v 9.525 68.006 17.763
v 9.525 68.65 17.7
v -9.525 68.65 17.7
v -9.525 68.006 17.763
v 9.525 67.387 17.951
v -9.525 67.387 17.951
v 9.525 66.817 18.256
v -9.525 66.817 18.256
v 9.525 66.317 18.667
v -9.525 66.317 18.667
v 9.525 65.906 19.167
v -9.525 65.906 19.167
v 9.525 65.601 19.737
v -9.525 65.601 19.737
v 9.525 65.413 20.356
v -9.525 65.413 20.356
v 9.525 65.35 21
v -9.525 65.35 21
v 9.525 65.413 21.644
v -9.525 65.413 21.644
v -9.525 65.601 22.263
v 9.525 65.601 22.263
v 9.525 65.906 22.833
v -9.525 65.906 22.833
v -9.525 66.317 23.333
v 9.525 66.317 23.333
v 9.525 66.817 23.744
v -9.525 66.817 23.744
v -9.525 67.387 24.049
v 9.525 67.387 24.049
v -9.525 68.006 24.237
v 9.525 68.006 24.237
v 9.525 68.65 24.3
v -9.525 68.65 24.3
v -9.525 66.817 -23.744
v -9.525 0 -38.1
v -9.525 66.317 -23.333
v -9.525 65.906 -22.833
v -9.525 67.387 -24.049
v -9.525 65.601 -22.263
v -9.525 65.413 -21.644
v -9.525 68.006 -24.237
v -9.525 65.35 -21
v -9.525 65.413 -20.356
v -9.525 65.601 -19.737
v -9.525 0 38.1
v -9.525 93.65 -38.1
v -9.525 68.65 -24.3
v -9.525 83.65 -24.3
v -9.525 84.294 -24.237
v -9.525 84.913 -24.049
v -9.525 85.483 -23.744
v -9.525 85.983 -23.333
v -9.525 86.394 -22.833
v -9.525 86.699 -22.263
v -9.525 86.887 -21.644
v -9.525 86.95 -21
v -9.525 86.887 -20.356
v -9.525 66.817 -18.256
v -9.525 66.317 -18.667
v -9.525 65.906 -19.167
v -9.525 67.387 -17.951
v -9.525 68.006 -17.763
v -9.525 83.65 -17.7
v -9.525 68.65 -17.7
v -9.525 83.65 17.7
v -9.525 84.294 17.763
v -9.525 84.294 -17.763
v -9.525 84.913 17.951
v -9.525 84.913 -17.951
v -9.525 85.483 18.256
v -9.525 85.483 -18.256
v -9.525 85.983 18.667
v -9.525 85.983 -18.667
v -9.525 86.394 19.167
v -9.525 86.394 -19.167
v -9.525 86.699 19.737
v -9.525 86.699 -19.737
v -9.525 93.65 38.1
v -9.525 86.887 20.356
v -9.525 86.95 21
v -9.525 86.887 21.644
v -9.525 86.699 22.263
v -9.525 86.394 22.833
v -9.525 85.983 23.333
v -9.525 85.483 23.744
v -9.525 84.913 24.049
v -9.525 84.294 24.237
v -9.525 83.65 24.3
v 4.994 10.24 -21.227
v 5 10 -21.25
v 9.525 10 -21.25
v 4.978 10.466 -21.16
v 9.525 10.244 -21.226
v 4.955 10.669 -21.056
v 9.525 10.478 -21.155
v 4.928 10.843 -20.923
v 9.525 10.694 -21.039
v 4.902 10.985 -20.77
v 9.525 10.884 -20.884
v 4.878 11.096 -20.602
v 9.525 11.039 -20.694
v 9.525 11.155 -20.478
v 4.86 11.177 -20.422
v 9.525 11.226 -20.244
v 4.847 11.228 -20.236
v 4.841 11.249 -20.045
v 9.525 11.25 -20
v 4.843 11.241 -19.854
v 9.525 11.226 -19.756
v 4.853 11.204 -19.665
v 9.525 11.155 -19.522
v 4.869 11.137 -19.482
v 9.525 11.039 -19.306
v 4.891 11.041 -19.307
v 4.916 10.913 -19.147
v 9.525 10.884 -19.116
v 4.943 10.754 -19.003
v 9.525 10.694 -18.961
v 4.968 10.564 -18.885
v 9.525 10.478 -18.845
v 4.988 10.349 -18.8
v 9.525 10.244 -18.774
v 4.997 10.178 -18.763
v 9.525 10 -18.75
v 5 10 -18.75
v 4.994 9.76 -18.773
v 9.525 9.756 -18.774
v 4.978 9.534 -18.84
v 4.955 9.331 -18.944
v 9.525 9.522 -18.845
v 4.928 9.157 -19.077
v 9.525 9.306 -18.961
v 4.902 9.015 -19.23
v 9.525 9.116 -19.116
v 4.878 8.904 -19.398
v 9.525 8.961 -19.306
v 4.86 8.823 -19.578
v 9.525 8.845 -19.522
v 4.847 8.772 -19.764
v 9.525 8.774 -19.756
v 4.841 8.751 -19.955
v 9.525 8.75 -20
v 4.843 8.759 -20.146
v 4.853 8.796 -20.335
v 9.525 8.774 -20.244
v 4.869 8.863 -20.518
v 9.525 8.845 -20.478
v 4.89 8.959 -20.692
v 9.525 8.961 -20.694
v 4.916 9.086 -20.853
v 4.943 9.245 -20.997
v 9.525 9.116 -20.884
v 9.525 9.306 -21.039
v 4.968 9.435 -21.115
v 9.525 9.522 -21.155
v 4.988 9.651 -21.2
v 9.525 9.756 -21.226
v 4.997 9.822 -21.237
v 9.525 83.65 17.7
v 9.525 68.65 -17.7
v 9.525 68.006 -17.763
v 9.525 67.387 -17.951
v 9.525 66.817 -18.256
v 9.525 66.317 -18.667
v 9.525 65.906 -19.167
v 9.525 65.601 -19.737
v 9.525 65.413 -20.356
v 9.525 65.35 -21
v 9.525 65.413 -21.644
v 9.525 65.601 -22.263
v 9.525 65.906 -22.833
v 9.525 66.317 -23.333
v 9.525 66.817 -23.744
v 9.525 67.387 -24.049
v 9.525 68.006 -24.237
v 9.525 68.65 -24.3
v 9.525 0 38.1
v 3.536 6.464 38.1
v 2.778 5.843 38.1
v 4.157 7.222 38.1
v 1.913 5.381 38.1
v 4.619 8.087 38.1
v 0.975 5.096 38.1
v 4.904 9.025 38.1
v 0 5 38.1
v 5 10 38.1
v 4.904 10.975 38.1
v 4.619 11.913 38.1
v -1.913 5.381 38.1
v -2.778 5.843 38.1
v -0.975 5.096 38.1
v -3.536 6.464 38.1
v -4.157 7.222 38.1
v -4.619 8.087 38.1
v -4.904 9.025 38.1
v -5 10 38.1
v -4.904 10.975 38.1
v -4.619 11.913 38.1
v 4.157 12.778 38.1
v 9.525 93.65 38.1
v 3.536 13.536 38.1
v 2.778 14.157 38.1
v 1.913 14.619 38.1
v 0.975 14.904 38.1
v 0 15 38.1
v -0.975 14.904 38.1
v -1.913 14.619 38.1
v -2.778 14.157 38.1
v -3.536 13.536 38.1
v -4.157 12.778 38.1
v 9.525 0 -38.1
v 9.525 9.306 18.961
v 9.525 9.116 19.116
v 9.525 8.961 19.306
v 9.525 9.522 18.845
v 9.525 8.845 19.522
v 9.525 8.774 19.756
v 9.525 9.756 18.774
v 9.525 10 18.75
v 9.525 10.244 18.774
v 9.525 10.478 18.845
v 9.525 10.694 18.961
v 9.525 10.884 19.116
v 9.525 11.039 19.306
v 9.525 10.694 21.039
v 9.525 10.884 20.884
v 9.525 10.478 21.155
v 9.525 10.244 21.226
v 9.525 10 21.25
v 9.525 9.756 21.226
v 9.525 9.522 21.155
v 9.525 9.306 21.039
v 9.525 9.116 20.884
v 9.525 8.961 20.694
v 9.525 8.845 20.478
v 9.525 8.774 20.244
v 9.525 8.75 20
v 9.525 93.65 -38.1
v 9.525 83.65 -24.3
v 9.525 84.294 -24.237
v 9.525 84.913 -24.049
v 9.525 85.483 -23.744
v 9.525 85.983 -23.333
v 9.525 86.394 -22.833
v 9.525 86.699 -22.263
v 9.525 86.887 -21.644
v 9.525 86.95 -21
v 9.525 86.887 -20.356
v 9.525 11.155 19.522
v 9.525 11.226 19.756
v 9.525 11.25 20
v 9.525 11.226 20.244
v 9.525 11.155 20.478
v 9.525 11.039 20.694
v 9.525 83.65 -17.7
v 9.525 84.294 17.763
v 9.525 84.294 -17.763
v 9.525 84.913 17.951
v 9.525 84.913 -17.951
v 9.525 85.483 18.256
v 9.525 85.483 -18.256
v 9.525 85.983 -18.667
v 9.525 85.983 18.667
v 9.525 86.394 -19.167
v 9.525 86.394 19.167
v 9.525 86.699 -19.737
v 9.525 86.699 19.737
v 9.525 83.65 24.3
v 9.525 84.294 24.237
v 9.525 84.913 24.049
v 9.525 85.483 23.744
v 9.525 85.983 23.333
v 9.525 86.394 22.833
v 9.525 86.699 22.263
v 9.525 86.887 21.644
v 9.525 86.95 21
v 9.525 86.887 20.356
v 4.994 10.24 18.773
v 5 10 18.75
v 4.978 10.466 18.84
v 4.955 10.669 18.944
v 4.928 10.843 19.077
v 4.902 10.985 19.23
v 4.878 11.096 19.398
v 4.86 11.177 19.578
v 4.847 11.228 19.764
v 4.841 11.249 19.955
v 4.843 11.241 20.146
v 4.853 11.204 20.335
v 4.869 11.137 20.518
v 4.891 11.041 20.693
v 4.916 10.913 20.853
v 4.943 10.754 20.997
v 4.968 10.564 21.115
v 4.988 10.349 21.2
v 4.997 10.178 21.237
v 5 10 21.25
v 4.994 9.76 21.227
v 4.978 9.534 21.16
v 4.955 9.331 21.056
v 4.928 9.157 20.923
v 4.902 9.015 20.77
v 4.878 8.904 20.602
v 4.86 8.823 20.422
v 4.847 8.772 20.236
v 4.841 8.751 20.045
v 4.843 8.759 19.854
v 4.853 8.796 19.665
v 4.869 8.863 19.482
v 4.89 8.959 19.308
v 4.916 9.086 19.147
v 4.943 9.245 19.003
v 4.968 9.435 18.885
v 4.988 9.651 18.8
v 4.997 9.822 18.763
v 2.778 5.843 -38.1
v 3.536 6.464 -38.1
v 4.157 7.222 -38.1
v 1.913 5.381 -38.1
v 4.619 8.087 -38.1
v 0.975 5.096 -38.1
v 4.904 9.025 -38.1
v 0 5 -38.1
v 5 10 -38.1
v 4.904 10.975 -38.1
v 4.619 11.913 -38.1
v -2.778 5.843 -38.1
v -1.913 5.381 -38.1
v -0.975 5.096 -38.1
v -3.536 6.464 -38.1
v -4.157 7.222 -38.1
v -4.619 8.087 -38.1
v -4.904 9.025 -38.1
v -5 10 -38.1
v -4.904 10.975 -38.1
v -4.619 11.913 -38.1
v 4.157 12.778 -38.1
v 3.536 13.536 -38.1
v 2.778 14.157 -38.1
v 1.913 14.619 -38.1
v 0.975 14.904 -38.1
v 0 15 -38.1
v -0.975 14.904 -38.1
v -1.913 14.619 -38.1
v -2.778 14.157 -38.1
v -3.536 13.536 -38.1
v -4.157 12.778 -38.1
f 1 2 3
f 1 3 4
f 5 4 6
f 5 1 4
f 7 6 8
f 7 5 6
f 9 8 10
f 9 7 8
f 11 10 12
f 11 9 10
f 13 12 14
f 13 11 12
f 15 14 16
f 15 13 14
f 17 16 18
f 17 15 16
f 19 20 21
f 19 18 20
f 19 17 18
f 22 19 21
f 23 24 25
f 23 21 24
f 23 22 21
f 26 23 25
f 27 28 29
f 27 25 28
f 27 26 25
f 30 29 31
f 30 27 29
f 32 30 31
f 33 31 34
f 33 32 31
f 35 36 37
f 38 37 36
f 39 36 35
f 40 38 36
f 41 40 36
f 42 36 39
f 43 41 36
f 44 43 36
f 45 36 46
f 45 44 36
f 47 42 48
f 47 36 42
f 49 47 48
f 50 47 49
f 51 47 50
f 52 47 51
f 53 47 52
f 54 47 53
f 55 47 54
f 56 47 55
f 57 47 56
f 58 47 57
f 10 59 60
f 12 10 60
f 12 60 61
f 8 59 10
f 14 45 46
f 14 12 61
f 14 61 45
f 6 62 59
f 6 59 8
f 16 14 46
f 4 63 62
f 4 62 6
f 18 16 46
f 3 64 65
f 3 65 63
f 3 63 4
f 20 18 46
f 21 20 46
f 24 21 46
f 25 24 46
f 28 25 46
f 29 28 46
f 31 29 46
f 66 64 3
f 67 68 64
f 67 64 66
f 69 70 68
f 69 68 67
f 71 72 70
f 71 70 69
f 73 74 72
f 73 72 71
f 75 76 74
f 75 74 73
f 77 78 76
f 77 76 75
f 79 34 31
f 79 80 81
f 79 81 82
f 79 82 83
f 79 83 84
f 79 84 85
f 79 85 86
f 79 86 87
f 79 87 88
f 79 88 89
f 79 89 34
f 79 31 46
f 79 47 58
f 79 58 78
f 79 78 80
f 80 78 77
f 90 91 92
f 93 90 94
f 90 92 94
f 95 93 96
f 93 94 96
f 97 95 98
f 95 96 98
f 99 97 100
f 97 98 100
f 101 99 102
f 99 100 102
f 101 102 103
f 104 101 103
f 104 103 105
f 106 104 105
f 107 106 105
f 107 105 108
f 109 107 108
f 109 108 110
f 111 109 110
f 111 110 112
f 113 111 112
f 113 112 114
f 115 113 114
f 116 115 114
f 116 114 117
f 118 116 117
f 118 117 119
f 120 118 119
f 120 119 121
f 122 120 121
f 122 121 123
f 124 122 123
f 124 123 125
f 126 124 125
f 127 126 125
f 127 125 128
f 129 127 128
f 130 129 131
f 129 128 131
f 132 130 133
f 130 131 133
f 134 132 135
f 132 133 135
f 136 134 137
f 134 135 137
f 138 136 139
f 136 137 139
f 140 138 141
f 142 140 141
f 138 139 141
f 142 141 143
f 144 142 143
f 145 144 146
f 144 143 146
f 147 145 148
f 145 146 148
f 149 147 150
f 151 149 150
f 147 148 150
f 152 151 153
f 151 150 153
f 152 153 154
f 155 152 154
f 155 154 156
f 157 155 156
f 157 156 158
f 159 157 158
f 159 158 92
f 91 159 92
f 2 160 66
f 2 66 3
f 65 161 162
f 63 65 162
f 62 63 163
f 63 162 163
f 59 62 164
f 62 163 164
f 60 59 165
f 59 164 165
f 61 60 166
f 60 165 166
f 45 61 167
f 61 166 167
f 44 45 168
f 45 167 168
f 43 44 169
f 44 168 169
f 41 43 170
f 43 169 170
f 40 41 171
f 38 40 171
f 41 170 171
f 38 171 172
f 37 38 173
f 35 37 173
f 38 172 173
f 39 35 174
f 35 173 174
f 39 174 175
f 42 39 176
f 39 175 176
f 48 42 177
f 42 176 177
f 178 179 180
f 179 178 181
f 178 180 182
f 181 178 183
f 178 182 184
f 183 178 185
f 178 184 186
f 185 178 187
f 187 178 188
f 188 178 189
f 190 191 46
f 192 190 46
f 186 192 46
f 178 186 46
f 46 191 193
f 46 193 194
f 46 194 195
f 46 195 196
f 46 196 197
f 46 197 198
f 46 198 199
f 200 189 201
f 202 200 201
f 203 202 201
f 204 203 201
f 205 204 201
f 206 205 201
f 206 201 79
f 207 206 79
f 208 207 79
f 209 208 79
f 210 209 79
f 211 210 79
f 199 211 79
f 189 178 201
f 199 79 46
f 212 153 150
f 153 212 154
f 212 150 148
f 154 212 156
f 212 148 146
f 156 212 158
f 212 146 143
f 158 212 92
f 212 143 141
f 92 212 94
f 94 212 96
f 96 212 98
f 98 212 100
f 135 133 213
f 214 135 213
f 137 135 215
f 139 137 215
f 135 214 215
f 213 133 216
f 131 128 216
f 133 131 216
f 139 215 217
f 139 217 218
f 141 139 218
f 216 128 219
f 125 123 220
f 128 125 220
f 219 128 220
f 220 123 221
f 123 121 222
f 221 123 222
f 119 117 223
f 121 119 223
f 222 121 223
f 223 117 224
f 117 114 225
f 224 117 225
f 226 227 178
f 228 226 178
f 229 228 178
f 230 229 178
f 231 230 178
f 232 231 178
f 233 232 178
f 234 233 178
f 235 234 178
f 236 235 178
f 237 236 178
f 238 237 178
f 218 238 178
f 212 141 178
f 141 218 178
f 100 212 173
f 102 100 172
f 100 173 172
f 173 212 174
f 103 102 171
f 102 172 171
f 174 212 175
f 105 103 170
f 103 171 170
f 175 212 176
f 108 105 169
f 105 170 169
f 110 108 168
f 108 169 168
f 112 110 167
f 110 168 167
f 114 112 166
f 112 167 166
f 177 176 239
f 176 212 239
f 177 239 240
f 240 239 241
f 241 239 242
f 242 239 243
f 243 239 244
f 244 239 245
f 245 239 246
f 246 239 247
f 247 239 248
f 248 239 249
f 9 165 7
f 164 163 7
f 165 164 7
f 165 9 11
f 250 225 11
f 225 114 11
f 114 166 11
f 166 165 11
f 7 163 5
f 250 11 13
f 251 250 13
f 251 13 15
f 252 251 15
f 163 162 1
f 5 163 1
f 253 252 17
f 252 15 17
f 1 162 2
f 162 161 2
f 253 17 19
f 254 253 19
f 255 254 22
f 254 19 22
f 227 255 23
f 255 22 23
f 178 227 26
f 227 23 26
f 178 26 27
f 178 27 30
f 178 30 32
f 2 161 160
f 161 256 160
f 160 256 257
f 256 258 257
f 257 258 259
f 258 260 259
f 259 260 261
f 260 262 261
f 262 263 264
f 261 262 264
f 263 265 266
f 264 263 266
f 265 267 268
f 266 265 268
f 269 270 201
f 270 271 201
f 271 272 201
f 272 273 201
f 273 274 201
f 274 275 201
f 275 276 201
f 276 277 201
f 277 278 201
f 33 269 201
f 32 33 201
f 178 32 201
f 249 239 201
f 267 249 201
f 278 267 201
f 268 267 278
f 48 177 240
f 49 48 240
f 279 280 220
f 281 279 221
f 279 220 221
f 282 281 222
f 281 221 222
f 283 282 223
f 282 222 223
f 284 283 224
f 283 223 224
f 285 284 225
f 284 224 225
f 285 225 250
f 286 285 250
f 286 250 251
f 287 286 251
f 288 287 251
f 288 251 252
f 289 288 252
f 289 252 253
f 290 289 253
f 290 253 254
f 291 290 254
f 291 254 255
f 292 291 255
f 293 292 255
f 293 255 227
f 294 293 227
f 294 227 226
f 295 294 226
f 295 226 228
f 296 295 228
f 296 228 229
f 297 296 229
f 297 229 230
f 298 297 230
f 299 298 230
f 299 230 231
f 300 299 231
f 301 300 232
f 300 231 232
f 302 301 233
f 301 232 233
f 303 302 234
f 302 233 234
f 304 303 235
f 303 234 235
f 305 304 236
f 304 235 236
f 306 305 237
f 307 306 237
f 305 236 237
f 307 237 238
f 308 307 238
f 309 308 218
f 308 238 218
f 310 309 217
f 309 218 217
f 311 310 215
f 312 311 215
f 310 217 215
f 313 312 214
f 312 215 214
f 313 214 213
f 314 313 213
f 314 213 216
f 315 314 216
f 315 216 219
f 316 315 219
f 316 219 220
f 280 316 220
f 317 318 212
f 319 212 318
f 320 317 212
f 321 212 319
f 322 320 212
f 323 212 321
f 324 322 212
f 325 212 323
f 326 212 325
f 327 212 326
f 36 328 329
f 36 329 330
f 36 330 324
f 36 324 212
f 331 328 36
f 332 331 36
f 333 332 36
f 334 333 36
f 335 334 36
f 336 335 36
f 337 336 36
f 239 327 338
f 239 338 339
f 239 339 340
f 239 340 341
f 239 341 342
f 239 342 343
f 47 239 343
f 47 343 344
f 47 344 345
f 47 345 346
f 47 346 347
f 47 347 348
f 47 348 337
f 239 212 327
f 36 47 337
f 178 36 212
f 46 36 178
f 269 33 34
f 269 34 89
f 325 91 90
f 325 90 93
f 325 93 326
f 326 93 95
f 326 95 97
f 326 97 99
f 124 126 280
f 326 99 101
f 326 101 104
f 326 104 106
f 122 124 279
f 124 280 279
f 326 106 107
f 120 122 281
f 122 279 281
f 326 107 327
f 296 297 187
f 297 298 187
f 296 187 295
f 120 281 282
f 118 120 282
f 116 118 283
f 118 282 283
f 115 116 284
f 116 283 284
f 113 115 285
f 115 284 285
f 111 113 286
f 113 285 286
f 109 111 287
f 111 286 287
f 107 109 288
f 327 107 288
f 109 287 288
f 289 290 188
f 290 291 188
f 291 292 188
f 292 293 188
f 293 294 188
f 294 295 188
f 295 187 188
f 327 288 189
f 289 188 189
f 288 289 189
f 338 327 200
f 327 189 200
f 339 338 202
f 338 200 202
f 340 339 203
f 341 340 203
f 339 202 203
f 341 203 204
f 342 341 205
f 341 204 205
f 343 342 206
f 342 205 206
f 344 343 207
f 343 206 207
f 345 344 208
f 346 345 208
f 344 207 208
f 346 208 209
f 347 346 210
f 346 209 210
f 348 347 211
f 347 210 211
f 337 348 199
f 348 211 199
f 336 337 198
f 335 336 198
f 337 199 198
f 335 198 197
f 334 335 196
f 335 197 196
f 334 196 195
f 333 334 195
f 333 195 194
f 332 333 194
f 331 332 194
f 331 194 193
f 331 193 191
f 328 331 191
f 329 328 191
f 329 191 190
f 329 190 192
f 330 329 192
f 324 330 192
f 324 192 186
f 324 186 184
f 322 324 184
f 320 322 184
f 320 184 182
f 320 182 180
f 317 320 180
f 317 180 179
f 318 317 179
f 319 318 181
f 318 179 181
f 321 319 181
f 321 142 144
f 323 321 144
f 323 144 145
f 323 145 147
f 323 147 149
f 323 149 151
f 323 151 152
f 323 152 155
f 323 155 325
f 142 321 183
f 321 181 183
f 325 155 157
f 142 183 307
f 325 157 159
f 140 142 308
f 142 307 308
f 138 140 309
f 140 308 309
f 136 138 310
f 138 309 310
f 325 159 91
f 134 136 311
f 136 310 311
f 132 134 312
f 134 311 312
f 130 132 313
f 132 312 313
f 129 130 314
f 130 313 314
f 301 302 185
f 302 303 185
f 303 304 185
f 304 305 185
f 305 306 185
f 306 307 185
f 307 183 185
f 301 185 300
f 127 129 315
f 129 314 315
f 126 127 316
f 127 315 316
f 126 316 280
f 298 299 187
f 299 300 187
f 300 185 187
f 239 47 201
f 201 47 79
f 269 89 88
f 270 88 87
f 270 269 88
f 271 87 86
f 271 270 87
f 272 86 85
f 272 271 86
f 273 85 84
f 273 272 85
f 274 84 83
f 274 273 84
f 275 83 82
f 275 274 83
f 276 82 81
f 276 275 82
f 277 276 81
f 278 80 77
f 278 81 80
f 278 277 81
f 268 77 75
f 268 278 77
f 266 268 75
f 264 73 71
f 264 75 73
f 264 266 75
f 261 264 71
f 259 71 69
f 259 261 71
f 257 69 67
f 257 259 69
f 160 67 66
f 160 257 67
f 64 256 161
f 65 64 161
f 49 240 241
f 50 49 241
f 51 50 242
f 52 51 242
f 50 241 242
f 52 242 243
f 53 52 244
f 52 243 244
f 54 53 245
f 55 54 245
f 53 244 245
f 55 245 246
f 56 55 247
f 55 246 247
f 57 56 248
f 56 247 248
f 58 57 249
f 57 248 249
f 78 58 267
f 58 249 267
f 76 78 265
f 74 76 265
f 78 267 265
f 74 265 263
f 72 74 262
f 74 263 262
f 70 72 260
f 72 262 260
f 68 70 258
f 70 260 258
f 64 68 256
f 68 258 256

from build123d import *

# Parameters (mm, degrees)
CROQUIS11_W                       = 76.2
CROQUIS11_H                       = 19.05
AL_SOLID_PROFILES_3_X_0_5_1_DEPTH = 93.65
CORTAR_EXTRUIR1_DEPTH             = 103.882627299
DI_METRO_DE_TALADRO_10_0_10_1_D   = 10
TALADRO_ROSCADO_M31_REACH         = 104.883
TALADRO_ROSCADO_M31_BORE_R        = 1.25


with BuildPart() as part:
    # Croquis11 → Al solid profiles 3 X 0.5(1) (new body)
    with BuildSketch(Plane(origin=(0, 93.65, 0), x_dir=(0, 0, 1), z_dir=(0, -1, 0))):
        Rectangle(CROQUIS11_W, CROQUIS11_H)
    extrude(amount=AL_SOLID_PROFILES_3_X_0_5_1_DEPTH)

    # Croquis12 → Cortar-Extruir1 (cut, through all)
    with BuildSketch(Plane(origin=(9.525, 0, 0), x_dir=(0, 0, -1), z_dir=(1, 0, 0))):
        with BuildLine():
            Line((-17.7, 83.65), (-17.7, 68.65))
            ThreePointArc((-17.7, 68.65), (-21, 65.35), (-24.3, 68.65))
            Line((-24.3, 68.65), (-24.3, 83.65))
            ThreePointArc((-24.3, 83.65), (-21, 86.95), (-17.7, 83.65))
        make_face()
        with BuildLine():
            Line((17.7, 83.65), (17.7, 68.65))
            ThreePointArc((17.7, 68.65), (21, 65.35), (24.3, 68.65))
            Line((24.3, 68.65), (24.3, 83.65))
            ThreePointArc((24.3, 83.65), (21, 86.95), (17.7, 83.65))
        make_face()
    extrude(amount=-CORTAR_EXTRUIR1_DEPTH, mode=Mode.SUBTRACT)

    # Diámetro de taladro Ø10.0 (10)1 (through all)
    with Locations(Plane(origin=(0, 0, -38.1), x_dir=(-1, 0, 0), z_dir=(0, 0, -1))):
        with Locations((0, 10)):
            Hole(DI_METRO_DE_TALADRO_10_0_10_1_D / 2)

    # Taladro roscado M31 bore → Taladro roscado M31 (cut, up to next)
    with BuildSketch(Plane(origin=(9.525, 0, 0), x_dir=(0, 0, -1), z_dir=(1, 0, 0)), mode=Mode.PRIVATE) as taladro_roscado_m31_sk1:
        with Locations((20, 10)):
            Circle(TALADRO_ROSCADO_M31_BORE_R)
    taladro_roscado_m31_tool1 = extrude(taladro_roscado_m31_sk1.sketch, amount=-TALADRO_ROSCADO_M31_REACH, mode=Mode.PRIVATE) & part.part
    # Taladro roscado M31 bore → Taladro roscado M31 (cut, up to next)
    with BuildSketch(Plane(origin=(9.525, 0, 0), x_dir=(0, 0, -1), z_dir=(1, 0, 0)), mode=Mode.PRIVATE) as taladro_roscado_m31_sk2:
        with Locations((-20, 10)):
            Circle(TALADRO_ROSCADO_M31_BORE_R)
    taladro_roscado_m31_tool2 = extrude(taladro_roscado_m31_sk2.sketch, amount=-TALADRO_ROSCADO_M31_REACH, mode=Mode.PRIVATE) & part.part
    add(taladro_roscado_m31_tool1.solids().sort_by_distance((9.525, 10, -20))[0], mode=Mode.SUBTRACT)
    add(taladro_roscado_m31_tool2.solids().sort_by_distance((9.525, 10, 20))[0], mode=Mode.SUBTRACT)


solid = part.part
